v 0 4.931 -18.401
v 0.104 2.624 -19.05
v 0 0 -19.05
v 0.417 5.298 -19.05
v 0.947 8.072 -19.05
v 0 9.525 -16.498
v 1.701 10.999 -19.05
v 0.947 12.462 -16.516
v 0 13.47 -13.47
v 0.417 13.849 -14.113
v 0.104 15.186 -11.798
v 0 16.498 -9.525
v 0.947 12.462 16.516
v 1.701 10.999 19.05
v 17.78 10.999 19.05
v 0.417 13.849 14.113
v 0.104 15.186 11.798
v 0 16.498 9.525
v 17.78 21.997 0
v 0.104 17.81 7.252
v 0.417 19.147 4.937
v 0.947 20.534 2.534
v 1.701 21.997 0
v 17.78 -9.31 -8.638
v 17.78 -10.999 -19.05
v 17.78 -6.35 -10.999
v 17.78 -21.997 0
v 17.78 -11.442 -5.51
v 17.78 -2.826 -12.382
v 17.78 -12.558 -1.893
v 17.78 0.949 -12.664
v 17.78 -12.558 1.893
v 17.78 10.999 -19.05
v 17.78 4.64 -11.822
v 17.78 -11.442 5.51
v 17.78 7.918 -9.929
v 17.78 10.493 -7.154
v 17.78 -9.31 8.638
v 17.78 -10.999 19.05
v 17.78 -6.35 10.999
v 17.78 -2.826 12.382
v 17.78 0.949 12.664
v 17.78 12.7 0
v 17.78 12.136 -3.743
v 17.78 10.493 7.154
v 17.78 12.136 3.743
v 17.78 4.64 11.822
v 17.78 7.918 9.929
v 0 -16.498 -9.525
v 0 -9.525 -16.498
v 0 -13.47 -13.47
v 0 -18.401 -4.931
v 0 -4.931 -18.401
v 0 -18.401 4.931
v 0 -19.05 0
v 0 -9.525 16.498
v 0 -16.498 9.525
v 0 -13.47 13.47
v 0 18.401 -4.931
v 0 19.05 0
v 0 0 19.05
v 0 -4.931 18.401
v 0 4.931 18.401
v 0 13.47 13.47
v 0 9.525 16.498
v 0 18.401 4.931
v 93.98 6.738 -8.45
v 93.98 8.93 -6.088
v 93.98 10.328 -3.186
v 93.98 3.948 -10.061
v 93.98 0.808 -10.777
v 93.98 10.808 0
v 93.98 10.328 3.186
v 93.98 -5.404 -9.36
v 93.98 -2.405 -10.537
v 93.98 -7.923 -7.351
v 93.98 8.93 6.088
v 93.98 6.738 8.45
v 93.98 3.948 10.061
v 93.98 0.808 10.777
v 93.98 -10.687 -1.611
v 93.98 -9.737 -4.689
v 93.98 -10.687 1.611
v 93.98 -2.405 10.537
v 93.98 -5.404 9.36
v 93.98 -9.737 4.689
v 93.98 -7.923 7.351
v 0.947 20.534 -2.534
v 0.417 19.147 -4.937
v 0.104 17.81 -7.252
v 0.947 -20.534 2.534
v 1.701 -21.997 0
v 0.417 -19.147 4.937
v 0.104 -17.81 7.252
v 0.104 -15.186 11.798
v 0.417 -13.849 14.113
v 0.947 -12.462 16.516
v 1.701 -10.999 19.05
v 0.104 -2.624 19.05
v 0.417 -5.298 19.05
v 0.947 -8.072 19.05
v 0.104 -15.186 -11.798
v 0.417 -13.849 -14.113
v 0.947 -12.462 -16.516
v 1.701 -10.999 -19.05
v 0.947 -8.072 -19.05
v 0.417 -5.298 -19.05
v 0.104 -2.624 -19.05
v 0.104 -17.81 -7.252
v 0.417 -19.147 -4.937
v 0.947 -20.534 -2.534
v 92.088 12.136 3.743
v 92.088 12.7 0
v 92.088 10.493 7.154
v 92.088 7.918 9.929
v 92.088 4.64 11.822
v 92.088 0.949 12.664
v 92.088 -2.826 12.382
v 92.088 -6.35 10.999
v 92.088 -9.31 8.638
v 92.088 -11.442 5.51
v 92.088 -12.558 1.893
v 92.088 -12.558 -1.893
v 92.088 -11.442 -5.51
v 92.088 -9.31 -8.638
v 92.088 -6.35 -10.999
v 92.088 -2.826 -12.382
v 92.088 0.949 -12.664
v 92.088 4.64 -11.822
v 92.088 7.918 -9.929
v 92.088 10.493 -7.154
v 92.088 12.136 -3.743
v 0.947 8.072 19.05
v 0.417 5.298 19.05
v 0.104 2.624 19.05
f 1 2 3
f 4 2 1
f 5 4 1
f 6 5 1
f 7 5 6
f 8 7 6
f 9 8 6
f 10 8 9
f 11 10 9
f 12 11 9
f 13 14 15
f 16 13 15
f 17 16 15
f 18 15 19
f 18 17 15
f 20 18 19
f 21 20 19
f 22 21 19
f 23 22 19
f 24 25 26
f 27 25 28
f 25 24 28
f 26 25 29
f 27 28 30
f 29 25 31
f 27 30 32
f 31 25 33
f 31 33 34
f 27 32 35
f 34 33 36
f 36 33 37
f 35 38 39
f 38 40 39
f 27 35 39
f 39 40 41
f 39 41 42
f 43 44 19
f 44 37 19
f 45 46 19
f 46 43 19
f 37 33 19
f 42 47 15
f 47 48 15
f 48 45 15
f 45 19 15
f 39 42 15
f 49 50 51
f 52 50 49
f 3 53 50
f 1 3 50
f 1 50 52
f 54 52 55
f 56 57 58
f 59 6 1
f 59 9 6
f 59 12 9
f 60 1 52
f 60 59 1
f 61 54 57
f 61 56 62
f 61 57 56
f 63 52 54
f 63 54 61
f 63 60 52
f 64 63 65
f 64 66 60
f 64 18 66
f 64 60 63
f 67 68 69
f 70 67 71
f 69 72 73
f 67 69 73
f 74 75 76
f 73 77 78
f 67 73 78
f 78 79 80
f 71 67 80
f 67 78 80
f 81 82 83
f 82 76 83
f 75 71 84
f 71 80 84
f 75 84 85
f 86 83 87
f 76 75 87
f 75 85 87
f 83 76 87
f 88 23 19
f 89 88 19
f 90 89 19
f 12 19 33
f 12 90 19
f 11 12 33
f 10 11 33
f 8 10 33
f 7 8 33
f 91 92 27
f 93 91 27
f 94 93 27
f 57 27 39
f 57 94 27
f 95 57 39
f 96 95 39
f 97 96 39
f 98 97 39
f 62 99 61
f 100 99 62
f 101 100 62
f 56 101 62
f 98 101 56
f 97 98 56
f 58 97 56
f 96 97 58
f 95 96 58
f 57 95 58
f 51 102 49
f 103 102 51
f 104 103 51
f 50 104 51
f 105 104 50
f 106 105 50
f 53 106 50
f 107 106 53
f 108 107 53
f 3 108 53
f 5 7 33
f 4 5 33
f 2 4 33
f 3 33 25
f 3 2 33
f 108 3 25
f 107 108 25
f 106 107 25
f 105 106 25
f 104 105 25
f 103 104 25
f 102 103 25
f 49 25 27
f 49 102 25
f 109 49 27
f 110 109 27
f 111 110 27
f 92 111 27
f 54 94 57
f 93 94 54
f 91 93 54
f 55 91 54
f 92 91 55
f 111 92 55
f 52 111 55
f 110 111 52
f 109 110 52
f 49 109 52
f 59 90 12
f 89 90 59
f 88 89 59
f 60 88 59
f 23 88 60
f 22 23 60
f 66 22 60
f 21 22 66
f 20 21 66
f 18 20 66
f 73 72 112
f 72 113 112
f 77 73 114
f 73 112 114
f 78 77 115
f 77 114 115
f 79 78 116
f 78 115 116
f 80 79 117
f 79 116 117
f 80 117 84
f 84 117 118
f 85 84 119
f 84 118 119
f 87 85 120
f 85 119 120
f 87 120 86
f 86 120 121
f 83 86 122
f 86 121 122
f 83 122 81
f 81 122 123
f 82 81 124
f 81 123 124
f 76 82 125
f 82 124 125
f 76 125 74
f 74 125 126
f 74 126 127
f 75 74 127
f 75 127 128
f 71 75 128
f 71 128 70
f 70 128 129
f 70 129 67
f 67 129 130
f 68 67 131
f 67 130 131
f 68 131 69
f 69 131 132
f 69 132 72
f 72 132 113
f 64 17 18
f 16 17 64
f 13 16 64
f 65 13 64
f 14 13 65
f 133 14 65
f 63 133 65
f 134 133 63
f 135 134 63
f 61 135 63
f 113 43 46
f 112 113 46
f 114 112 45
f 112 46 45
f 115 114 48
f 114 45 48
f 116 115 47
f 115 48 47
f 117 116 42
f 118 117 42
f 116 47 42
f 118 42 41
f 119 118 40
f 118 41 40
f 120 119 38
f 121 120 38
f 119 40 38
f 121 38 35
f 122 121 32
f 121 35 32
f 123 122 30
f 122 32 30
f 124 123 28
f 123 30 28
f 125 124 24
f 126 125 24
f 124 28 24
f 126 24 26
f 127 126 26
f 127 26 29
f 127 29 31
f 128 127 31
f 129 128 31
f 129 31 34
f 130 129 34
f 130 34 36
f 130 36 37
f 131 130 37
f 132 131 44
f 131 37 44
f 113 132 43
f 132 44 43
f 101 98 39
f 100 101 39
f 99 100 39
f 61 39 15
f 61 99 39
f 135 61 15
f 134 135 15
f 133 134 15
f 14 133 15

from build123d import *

# Parameters (mm, degrees)
BASEHEAD_DEPTH = 17.78


with BuildPart() as part:
    # Sketch1 → BaseHead (new body)
    with BuildSketch(Plane(origin=(0, 0, 0), x_dir=(0, 0, -1), z_dir=(1, 0, 0))):
        Polygon((19.05, 10.998522628), (19.05, -10.998522628), (0, -21.997045256), (-19.05, -10.998522628), (-19.05, 10.998522628), (0, 21.997045256), align=None)
    extrude(amount=BASEHEAD_DEPTH)

    # BodySke → BaseBody (revolve)
    with BuildSketch(Plane.XY):
        Polygon((0, 0), (93.98, 0), (93.98, 10.8077), (92.0877, 12.7), (0, 12.7), align=None)
    revolve(axis=Axis((0, 0, 0), (1, 0, 0)))

    # Sketch3 → HeadChamfer (revolve, cut)
    with BuildSketch(Plane.XY):
        Polygon((0, 19.05), (5.367651581, 28.347045256), (5.367651581, 34.697045256), (-12.7, 34.697045256), (-12.7, 19.05), align=None)
    revolve(axis=Axis((0, 0, 0), (1, 0, 0)), mode=Mode.SUBTRACT)


solid = part.part
